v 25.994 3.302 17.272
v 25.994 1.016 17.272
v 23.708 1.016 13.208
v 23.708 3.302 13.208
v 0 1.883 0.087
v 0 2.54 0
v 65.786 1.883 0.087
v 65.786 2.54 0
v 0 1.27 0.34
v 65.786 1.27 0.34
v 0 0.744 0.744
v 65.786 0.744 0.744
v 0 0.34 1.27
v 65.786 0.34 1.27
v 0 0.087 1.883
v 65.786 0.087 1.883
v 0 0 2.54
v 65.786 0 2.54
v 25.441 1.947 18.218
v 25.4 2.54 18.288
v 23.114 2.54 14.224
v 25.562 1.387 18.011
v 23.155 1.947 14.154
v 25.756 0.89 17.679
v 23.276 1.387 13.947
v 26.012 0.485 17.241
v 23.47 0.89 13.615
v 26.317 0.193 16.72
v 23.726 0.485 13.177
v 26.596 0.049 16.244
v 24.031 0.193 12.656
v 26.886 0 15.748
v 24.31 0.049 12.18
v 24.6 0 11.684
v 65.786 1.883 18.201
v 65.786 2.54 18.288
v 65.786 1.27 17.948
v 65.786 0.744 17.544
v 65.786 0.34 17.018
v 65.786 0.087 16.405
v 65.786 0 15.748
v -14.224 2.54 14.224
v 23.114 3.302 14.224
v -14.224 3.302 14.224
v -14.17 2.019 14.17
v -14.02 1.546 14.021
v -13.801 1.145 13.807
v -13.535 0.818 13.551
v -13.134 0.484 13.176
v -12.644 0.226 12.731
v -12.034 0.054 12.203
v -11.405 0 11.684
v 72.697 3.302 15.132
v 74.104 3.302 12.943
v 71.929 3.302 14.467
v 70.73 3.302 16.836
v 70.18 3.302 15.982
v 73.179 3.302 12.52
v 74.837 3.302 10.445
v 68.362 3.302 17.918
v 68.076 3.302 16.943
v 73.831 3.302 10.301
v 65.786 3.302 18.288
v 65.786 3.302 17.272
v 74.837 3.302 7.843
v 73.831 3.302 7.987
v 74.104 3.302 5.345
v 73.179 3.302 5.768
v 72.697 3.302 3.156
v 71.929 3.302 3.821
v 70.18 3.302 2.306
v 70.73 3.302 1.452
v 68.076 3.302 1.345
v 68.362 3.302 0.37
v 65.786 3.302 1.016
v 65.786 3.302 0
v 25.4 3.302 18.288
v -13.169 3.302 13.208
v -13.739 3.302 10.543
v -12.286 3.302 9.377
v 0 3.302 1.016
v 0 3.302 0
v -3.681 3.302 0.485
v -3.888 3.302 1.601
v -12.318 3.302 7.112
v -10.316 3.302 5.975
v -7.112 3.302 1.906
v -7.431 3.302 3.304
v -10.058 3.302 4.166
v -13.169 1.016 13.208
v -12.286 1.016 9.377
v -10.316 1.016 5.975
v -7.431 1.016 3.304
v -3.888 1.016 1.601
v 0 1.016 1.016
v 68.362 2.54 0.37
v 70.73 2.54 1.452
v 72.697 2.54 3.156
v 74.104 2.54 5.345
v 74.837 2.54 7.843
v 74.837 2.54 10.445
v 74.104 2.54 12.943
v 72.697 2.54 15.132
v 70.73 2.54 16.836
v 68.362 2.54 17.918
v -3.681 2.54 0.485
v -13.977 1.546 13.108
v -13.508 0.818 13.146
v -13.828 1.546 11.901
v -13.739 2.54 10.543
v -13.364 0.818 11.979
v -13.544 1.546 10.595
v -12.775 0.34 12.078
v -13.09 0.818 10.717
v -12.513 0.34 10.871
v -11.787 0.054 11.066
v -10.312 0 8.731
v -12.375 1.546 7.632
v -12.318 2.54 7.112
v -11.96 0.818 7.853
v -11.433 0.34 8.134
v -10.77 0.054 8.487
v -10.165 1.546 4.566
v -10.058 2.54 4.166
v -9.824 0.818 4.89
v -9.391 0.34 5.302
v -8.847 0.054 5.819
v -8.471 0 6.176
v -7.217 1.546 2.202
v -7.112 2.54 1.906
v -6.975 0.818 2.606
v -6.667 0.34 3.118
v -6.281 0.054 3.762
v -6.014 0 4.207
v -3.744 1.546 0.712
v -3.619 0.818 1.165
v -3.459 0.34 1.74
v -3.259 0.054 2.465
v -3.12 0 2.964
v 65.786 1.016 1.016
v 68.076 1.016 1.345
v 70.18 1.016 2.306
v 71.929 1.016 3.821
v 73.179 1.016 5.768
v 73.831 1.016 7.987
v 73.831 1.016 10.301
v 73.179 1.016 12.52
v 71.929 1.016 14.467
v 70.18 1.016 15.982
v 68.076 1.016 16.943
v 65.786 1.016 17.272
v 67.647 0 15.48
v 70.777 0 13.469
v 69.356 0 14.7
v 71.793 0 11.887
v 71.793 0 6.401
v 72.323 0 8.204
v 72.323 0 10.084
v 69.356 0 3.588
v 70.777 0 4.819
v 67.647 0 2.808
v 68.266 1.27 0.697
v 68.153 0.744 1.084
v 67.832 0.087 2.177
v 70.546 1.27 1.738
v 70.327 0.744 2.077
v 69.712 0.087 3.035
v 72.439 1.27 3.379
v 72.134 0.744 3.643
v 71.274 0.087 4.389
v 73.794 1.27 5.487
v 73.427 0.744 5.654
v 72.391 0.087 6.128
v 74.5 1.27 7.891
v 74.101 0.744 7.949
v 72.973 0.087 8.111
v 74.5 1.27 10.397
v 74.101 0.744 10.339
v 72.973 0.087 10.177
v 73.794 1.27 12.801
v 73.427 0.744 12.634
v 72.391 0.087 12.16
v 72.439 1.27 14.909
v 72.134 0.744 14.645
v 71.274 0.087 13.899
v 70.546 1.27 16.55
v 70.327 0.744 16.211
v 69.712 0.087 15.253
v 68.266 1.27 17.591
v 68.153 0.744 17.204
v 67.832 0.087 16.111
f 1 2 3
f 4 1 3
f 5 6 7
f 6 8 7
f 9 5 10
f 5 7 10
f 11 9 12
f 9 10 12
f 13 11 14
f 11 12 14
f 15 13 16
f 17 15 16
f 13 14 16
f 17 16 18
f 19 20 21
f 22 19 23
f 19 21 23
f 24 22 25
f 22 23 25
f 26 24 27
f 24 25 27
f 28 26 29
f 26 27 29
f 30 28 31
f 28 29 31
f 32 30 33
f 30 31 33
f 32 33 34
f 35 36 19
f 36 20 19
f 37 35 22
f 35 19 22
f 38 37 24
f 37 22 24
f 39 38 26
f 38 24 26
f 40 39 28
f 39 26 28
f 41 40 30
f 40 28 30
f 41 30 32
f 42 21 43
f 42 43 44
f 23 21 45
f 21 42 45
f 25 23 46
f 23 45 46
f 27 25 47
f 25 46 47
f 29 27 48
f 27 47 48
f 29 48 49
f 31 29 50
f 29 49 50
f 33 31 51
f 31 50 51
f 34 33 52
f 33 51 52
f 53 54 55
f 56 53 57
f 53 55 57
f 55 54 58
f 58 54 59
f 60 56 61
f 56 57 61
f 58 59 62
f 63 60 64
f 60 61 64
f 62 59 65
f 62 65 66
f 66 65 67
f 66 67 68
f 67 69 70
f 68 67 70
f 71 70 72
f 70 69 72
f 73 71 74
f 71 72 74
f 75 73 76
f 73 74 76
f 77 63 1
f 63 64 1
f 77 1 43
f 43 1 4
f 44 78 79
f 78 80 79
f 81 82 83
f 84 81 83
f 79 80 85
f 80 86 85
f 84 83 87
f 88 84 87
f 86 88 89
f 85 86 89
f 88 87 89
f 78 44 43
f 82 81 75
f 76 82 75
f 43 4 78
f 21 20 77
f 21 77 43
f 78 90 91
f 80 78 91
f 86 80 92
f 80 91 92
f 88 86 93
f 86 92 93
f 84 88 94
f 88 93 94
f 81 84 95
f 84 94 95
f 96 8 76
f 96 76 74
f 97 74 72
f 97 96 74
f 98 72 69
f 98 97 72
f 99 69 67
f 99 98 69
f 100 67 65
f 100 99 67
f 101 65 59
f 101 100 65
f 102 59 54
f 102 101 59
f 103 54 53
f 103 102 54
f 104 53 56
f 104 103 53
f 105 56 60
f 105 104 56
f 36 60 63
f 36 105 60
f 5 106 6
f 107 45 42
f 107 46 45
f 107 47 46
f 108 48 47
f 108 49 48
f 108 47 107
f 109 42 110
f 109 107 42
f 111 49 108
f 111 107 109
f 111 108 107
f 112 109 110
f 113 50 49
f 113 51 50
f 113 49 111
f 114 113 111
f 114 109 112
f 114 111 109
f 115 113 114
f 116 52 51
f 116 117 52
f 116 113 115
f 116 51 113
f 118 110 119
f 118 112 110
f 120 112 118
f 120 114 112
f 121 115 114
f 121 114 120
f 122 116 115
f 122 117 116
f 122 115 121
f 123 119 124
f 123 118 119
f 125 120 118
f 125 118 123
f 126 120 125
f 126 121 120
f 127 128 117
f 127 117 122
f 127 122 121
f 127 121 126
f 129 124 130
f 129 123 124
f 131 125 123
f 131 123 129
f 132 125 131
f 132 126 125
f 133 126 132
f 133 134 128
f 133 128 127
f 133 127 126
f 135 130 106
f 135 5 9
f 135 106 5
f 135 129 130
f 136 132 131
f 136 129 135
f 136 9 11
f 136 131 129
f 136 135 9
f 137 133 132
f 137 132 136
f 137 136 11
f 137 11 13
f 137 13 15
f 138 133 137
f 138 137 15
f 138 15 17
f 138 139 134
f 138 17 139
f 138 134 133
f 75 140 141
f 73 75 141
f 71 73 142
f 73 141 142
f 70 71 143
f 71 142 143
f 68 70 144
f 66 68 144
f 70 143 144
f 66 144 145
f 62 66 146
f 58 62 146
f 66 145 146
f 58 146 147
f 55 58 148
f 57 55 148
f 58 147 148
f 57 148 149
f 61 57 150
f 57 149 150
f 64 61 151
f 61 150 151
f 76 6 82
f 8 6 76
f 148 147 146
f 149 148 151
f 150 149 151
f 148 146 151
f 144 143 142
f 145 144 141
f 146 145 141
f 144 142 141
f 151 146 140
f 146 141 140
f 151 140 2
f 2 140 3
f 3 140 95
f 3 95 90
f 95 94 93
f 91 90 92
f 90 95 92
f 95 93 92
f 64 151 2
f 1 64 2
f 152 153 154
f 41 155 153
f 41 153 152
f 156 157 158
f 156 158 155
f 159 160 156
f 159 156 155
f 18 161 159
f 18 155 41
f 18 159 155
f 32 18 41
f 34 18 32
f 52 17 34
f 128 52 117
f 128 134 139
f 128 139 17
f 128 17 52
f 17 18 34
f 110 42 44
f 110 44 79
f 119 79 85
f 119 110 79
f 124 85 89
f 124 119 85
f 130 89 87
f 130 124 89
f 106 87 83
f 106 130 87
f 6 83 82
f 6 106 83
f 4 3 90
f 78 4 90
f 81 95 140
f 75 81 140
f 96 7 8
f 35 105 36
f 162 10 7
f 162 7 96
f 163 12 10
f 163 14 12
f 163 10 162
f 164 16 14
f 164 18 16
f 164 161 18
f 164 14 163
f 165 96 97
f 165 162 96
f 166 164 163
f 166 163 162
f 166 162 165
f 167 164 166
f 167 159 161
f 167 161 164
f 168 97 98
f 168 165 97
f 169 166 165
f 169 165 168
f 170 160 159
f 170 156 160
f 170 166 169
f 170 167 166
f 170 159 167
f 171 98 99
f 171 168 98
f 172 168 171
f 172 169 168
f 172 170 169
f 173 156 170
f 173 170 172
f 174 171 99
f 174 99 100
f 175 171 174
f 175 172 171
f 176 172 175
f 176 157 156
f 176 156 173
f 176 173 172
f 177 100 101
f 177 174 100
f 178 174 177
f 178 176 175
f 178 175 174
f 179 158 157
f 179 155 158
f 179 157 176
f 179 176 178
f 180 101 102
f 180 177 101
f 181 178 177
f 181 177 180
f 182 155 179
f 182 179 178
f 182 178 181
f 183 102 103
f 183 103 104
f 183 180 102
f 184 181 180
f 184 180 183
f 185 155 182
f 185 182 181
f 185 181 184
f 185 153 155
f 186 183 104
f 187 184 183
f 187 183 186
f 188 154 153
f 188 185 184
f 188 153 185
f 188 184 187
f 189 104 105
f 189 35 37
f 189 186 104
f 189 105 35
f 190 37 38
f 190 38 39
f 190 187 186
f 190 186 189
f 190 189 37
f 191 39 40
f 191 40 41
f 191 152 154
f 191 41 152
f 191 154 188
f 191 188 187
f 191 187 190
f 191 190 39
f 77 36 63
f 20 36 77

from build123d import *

# Parameters (mm, degrees)
BOSS_EXTRUDE1_DEPTH = 3.302
SHELL3_T            = -1.016
FILLET2_R           = 2.54


with BuildPart() as part:
    # Sketch1 → Boss-Extrude1 (new body)
    with BuildSketch(Plane(origin=(0, 0, 0), x_dir=(1, 0, 0), z_dir=(0, 1, 0))):
        with BuildLine():
            Line((0, 0), (65.786, 0))
            ThreePointArc((65.786, 0), (74.93, -9.144), (65.786, -18.288))
            Line((65.786, -18.288), (25.4, -18.288))
            Line((25.4, -18.288), (23.114, -14.224))
            Line((23.114, -14.224), (-14.224, -14.224))
            ThreePointArc((-14.224, -14.224), (-10.057886856, -4.166113144), (0, 0))
        make_face()
    extrude(amount=BOSS_EXTRUDE1_DEPTH)

    # Shell3
    shell3_openings = [part.faces().sort_by_distance(p)[0] for p in [
        (28.676685524, 3.302, 10.346352191),
    ]]
    offset(amount=SHELL3_T, openings=shell3_openings, kind=Kind.INTERSECTION)

    # Fillet2
    fillet2_edges = [part.edges().sort_by_distance(p)[0] for p in [
        (32.893, 0, 0),
        (74.93, 0, 9.144),
        (45.593, 0, 18.288),
        (24.257, 0, 16.256),
        (4.445, 0, 14.224),
        (-10.057886856, 0, 4.166113144),
    ]]
    fillet(fillet2_edges, radius=FILLET2_R)


solid = part.part
